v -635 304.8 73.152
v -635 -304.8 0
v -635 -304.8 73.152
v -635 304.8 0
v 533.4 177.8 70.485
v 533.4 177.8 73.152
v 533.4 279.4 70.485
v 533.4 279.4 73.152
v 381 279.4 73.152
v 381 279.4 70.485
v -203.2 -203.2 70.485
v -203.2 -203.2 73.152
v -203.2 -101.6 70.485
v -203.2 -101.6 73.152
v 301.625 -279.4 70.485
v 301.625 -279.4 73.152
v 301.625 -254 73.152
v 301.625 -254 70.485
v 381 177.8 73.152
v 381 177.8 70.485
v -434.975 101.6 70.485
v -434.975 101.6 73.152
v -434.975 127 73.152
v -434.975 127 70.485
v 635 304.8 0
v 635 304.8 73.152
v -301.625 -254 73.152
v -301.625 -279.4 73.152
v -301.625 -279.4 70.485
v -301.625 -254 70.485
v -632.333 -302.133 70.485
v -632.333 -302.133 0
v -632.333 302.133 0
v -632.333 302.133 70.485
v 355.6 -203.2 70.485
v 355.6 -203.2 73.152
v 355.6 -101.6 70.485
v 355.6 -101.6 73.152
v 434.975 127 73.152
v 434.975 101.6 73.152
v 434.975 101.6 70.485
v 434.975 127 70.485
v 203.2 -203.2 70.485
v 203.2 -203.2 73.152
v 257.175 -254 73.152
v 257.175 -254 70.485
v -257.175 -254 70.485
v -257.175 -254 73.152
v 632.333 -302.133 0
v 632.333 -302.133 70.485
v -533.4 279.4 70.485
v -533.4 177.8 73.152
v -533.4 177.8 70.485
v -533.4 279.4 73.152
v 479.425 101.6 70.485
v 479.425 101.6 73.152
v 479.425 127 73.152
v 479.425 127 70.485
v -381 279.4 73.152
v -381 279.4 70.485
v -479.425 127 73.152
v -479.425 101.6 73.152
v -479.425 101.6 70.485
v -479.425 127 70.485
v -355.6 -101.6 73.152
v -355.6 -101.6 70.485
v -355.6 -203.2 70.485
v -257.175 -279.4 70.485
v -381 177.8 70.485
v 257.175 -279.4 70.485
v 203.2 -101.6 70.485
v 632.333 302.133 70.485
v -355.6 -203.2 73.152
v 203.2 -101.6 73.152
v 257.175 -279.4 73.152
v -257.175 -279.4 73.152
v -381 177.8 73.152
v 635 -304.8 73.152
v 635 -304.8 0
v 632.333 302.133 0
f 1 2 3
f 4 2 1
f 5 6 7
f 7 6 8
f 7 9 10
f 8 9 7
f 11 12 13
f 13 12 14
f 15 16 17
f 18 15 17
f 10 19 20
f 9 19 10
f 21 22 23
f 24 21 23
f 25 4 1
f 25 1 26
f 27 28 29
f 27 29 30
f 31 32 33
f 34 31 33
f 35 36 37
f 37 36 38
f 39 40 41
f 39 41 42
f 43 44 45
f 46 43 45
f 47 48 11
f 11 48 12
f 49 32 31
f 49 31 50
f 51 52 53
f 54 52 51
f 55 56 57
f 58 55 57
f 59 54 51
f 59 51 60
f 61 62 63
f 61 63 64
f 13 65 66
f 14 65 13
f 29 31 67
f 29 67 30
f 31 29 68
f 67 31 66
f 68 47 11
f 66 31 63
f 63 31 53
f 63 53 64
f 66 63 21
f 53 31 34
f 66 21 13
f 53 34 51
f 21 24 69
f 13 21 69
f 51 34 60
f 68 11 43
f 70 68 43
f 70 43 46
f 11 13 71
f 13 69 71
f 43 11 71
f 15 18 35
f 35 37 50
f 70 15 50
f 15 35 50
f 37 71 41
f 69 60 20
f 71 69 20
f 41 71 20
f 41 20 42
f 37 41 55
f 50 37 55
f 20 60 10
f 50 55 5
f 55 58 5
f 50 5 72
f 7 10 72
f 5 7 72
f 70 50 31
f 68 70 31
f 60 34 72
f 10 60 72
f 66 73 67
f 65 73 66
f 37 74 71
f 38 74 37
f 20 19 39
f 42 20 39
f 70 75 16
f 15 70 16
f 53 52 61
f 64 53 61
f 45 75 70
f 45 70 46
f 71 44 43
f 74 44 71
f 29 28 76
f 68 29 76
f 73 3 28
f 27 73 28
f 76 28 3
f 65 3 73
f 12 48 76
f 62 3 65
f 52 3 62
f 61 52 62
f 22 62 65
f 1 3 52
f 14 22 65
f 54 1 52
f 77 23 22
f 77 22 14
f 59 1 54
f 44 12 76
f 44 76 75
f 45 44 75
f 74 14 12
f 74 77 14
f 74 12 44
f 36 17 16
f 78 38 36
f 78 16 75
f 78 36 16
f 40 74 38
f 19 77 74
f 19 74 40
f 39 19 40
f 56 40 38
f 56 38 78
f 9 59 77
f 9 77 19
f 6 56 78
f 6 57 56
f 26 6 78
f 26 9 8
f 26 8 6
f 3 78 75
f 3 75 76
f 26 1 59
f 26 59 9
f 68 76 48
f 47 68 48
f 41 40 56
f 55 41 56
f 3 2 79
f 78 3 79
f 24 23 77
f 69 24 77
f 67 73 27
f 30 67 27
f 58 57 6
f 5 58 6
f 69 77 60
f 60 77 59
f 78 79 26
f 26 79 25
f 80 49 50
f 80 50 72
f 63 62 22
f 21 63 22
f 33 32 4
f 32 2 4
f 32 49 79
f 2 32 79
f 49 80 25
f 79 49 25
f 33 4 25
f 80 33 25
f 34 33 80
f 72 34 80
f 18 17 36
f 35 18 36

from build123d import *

# Parameters (mm, degrees)
F0_W     = 1270
F0_H     = 609.6
F1_DEPTH = 73.152
F2_T     = -2.667
F3_W     = 152.4
F3_H     = 101.6
F3_W_2   = 44.45
F3_H_2   = 25.4
F4_DEPTH = 73.153


with BuildPart() as f1:
    # F0 (on Top) → F1 (new body)
    with BuildSketch(Plane.XY):
        Rectangle(F0_W, F0_H)
    extrude(amount=F1_DEPTH)

    # F2
    f2_openings = [f1.faces().sort_by_distance(p)[0] for p in [
        (0, 0, 0),
    ]]
    offset(amount=F2_T, openings=f2_openings)

    # F3 (on face) → F4 (cut, through all)
    with BuildSketch(Plane.XY.offset(73.152)):
        with Locations((-457.2, 228.6)):
            Rectangle(F3_W, F3_H)
        Polygon((-434.975, 127), (-381, 177.8), (-533.4, 177.8), (-479.425, 127), align=None)
        with Locations((-457.2, 114.3)):
            Rectangle(F3_W_2, F3_H_2)
        with Locations((-279.4, -152.4)):
            Rectangle(F3_W, F3_H)
        Polygon((-257.175, -254), (-203.2, -203.2), (-355.6, -203.2), (-301.625, -254), align=None)
        with Locations((-279.4, -266.7)):
            Rectangle(F3_W_2, F3_H_2)
        with Locations((279.4, -152.4)):
            Rectangle(F3_W, F3_H)
        Polygon((301.625, -254), (355.6, -203.2), (203.2, -203.2), (257.175, -254), align=None)
        with Locations((279.4, -266.7)):
            Rectangle(F3_W_2, F3_H_2)
        with Locations((457.2, 228.6)):
            Rectangle(F3_W, F3_H)
        Polygon((479.425, 127), (533.4, 177.8), (381, 177.8), (434.975, 127), align=None)
        with Locations((457.2, 114.3)):
            Rectangle(F3_W_2, F3_H_2)
    extrude(amount=-F4_DEPTH, mode=Mode.SUBTRACT)


solid = f1.part
